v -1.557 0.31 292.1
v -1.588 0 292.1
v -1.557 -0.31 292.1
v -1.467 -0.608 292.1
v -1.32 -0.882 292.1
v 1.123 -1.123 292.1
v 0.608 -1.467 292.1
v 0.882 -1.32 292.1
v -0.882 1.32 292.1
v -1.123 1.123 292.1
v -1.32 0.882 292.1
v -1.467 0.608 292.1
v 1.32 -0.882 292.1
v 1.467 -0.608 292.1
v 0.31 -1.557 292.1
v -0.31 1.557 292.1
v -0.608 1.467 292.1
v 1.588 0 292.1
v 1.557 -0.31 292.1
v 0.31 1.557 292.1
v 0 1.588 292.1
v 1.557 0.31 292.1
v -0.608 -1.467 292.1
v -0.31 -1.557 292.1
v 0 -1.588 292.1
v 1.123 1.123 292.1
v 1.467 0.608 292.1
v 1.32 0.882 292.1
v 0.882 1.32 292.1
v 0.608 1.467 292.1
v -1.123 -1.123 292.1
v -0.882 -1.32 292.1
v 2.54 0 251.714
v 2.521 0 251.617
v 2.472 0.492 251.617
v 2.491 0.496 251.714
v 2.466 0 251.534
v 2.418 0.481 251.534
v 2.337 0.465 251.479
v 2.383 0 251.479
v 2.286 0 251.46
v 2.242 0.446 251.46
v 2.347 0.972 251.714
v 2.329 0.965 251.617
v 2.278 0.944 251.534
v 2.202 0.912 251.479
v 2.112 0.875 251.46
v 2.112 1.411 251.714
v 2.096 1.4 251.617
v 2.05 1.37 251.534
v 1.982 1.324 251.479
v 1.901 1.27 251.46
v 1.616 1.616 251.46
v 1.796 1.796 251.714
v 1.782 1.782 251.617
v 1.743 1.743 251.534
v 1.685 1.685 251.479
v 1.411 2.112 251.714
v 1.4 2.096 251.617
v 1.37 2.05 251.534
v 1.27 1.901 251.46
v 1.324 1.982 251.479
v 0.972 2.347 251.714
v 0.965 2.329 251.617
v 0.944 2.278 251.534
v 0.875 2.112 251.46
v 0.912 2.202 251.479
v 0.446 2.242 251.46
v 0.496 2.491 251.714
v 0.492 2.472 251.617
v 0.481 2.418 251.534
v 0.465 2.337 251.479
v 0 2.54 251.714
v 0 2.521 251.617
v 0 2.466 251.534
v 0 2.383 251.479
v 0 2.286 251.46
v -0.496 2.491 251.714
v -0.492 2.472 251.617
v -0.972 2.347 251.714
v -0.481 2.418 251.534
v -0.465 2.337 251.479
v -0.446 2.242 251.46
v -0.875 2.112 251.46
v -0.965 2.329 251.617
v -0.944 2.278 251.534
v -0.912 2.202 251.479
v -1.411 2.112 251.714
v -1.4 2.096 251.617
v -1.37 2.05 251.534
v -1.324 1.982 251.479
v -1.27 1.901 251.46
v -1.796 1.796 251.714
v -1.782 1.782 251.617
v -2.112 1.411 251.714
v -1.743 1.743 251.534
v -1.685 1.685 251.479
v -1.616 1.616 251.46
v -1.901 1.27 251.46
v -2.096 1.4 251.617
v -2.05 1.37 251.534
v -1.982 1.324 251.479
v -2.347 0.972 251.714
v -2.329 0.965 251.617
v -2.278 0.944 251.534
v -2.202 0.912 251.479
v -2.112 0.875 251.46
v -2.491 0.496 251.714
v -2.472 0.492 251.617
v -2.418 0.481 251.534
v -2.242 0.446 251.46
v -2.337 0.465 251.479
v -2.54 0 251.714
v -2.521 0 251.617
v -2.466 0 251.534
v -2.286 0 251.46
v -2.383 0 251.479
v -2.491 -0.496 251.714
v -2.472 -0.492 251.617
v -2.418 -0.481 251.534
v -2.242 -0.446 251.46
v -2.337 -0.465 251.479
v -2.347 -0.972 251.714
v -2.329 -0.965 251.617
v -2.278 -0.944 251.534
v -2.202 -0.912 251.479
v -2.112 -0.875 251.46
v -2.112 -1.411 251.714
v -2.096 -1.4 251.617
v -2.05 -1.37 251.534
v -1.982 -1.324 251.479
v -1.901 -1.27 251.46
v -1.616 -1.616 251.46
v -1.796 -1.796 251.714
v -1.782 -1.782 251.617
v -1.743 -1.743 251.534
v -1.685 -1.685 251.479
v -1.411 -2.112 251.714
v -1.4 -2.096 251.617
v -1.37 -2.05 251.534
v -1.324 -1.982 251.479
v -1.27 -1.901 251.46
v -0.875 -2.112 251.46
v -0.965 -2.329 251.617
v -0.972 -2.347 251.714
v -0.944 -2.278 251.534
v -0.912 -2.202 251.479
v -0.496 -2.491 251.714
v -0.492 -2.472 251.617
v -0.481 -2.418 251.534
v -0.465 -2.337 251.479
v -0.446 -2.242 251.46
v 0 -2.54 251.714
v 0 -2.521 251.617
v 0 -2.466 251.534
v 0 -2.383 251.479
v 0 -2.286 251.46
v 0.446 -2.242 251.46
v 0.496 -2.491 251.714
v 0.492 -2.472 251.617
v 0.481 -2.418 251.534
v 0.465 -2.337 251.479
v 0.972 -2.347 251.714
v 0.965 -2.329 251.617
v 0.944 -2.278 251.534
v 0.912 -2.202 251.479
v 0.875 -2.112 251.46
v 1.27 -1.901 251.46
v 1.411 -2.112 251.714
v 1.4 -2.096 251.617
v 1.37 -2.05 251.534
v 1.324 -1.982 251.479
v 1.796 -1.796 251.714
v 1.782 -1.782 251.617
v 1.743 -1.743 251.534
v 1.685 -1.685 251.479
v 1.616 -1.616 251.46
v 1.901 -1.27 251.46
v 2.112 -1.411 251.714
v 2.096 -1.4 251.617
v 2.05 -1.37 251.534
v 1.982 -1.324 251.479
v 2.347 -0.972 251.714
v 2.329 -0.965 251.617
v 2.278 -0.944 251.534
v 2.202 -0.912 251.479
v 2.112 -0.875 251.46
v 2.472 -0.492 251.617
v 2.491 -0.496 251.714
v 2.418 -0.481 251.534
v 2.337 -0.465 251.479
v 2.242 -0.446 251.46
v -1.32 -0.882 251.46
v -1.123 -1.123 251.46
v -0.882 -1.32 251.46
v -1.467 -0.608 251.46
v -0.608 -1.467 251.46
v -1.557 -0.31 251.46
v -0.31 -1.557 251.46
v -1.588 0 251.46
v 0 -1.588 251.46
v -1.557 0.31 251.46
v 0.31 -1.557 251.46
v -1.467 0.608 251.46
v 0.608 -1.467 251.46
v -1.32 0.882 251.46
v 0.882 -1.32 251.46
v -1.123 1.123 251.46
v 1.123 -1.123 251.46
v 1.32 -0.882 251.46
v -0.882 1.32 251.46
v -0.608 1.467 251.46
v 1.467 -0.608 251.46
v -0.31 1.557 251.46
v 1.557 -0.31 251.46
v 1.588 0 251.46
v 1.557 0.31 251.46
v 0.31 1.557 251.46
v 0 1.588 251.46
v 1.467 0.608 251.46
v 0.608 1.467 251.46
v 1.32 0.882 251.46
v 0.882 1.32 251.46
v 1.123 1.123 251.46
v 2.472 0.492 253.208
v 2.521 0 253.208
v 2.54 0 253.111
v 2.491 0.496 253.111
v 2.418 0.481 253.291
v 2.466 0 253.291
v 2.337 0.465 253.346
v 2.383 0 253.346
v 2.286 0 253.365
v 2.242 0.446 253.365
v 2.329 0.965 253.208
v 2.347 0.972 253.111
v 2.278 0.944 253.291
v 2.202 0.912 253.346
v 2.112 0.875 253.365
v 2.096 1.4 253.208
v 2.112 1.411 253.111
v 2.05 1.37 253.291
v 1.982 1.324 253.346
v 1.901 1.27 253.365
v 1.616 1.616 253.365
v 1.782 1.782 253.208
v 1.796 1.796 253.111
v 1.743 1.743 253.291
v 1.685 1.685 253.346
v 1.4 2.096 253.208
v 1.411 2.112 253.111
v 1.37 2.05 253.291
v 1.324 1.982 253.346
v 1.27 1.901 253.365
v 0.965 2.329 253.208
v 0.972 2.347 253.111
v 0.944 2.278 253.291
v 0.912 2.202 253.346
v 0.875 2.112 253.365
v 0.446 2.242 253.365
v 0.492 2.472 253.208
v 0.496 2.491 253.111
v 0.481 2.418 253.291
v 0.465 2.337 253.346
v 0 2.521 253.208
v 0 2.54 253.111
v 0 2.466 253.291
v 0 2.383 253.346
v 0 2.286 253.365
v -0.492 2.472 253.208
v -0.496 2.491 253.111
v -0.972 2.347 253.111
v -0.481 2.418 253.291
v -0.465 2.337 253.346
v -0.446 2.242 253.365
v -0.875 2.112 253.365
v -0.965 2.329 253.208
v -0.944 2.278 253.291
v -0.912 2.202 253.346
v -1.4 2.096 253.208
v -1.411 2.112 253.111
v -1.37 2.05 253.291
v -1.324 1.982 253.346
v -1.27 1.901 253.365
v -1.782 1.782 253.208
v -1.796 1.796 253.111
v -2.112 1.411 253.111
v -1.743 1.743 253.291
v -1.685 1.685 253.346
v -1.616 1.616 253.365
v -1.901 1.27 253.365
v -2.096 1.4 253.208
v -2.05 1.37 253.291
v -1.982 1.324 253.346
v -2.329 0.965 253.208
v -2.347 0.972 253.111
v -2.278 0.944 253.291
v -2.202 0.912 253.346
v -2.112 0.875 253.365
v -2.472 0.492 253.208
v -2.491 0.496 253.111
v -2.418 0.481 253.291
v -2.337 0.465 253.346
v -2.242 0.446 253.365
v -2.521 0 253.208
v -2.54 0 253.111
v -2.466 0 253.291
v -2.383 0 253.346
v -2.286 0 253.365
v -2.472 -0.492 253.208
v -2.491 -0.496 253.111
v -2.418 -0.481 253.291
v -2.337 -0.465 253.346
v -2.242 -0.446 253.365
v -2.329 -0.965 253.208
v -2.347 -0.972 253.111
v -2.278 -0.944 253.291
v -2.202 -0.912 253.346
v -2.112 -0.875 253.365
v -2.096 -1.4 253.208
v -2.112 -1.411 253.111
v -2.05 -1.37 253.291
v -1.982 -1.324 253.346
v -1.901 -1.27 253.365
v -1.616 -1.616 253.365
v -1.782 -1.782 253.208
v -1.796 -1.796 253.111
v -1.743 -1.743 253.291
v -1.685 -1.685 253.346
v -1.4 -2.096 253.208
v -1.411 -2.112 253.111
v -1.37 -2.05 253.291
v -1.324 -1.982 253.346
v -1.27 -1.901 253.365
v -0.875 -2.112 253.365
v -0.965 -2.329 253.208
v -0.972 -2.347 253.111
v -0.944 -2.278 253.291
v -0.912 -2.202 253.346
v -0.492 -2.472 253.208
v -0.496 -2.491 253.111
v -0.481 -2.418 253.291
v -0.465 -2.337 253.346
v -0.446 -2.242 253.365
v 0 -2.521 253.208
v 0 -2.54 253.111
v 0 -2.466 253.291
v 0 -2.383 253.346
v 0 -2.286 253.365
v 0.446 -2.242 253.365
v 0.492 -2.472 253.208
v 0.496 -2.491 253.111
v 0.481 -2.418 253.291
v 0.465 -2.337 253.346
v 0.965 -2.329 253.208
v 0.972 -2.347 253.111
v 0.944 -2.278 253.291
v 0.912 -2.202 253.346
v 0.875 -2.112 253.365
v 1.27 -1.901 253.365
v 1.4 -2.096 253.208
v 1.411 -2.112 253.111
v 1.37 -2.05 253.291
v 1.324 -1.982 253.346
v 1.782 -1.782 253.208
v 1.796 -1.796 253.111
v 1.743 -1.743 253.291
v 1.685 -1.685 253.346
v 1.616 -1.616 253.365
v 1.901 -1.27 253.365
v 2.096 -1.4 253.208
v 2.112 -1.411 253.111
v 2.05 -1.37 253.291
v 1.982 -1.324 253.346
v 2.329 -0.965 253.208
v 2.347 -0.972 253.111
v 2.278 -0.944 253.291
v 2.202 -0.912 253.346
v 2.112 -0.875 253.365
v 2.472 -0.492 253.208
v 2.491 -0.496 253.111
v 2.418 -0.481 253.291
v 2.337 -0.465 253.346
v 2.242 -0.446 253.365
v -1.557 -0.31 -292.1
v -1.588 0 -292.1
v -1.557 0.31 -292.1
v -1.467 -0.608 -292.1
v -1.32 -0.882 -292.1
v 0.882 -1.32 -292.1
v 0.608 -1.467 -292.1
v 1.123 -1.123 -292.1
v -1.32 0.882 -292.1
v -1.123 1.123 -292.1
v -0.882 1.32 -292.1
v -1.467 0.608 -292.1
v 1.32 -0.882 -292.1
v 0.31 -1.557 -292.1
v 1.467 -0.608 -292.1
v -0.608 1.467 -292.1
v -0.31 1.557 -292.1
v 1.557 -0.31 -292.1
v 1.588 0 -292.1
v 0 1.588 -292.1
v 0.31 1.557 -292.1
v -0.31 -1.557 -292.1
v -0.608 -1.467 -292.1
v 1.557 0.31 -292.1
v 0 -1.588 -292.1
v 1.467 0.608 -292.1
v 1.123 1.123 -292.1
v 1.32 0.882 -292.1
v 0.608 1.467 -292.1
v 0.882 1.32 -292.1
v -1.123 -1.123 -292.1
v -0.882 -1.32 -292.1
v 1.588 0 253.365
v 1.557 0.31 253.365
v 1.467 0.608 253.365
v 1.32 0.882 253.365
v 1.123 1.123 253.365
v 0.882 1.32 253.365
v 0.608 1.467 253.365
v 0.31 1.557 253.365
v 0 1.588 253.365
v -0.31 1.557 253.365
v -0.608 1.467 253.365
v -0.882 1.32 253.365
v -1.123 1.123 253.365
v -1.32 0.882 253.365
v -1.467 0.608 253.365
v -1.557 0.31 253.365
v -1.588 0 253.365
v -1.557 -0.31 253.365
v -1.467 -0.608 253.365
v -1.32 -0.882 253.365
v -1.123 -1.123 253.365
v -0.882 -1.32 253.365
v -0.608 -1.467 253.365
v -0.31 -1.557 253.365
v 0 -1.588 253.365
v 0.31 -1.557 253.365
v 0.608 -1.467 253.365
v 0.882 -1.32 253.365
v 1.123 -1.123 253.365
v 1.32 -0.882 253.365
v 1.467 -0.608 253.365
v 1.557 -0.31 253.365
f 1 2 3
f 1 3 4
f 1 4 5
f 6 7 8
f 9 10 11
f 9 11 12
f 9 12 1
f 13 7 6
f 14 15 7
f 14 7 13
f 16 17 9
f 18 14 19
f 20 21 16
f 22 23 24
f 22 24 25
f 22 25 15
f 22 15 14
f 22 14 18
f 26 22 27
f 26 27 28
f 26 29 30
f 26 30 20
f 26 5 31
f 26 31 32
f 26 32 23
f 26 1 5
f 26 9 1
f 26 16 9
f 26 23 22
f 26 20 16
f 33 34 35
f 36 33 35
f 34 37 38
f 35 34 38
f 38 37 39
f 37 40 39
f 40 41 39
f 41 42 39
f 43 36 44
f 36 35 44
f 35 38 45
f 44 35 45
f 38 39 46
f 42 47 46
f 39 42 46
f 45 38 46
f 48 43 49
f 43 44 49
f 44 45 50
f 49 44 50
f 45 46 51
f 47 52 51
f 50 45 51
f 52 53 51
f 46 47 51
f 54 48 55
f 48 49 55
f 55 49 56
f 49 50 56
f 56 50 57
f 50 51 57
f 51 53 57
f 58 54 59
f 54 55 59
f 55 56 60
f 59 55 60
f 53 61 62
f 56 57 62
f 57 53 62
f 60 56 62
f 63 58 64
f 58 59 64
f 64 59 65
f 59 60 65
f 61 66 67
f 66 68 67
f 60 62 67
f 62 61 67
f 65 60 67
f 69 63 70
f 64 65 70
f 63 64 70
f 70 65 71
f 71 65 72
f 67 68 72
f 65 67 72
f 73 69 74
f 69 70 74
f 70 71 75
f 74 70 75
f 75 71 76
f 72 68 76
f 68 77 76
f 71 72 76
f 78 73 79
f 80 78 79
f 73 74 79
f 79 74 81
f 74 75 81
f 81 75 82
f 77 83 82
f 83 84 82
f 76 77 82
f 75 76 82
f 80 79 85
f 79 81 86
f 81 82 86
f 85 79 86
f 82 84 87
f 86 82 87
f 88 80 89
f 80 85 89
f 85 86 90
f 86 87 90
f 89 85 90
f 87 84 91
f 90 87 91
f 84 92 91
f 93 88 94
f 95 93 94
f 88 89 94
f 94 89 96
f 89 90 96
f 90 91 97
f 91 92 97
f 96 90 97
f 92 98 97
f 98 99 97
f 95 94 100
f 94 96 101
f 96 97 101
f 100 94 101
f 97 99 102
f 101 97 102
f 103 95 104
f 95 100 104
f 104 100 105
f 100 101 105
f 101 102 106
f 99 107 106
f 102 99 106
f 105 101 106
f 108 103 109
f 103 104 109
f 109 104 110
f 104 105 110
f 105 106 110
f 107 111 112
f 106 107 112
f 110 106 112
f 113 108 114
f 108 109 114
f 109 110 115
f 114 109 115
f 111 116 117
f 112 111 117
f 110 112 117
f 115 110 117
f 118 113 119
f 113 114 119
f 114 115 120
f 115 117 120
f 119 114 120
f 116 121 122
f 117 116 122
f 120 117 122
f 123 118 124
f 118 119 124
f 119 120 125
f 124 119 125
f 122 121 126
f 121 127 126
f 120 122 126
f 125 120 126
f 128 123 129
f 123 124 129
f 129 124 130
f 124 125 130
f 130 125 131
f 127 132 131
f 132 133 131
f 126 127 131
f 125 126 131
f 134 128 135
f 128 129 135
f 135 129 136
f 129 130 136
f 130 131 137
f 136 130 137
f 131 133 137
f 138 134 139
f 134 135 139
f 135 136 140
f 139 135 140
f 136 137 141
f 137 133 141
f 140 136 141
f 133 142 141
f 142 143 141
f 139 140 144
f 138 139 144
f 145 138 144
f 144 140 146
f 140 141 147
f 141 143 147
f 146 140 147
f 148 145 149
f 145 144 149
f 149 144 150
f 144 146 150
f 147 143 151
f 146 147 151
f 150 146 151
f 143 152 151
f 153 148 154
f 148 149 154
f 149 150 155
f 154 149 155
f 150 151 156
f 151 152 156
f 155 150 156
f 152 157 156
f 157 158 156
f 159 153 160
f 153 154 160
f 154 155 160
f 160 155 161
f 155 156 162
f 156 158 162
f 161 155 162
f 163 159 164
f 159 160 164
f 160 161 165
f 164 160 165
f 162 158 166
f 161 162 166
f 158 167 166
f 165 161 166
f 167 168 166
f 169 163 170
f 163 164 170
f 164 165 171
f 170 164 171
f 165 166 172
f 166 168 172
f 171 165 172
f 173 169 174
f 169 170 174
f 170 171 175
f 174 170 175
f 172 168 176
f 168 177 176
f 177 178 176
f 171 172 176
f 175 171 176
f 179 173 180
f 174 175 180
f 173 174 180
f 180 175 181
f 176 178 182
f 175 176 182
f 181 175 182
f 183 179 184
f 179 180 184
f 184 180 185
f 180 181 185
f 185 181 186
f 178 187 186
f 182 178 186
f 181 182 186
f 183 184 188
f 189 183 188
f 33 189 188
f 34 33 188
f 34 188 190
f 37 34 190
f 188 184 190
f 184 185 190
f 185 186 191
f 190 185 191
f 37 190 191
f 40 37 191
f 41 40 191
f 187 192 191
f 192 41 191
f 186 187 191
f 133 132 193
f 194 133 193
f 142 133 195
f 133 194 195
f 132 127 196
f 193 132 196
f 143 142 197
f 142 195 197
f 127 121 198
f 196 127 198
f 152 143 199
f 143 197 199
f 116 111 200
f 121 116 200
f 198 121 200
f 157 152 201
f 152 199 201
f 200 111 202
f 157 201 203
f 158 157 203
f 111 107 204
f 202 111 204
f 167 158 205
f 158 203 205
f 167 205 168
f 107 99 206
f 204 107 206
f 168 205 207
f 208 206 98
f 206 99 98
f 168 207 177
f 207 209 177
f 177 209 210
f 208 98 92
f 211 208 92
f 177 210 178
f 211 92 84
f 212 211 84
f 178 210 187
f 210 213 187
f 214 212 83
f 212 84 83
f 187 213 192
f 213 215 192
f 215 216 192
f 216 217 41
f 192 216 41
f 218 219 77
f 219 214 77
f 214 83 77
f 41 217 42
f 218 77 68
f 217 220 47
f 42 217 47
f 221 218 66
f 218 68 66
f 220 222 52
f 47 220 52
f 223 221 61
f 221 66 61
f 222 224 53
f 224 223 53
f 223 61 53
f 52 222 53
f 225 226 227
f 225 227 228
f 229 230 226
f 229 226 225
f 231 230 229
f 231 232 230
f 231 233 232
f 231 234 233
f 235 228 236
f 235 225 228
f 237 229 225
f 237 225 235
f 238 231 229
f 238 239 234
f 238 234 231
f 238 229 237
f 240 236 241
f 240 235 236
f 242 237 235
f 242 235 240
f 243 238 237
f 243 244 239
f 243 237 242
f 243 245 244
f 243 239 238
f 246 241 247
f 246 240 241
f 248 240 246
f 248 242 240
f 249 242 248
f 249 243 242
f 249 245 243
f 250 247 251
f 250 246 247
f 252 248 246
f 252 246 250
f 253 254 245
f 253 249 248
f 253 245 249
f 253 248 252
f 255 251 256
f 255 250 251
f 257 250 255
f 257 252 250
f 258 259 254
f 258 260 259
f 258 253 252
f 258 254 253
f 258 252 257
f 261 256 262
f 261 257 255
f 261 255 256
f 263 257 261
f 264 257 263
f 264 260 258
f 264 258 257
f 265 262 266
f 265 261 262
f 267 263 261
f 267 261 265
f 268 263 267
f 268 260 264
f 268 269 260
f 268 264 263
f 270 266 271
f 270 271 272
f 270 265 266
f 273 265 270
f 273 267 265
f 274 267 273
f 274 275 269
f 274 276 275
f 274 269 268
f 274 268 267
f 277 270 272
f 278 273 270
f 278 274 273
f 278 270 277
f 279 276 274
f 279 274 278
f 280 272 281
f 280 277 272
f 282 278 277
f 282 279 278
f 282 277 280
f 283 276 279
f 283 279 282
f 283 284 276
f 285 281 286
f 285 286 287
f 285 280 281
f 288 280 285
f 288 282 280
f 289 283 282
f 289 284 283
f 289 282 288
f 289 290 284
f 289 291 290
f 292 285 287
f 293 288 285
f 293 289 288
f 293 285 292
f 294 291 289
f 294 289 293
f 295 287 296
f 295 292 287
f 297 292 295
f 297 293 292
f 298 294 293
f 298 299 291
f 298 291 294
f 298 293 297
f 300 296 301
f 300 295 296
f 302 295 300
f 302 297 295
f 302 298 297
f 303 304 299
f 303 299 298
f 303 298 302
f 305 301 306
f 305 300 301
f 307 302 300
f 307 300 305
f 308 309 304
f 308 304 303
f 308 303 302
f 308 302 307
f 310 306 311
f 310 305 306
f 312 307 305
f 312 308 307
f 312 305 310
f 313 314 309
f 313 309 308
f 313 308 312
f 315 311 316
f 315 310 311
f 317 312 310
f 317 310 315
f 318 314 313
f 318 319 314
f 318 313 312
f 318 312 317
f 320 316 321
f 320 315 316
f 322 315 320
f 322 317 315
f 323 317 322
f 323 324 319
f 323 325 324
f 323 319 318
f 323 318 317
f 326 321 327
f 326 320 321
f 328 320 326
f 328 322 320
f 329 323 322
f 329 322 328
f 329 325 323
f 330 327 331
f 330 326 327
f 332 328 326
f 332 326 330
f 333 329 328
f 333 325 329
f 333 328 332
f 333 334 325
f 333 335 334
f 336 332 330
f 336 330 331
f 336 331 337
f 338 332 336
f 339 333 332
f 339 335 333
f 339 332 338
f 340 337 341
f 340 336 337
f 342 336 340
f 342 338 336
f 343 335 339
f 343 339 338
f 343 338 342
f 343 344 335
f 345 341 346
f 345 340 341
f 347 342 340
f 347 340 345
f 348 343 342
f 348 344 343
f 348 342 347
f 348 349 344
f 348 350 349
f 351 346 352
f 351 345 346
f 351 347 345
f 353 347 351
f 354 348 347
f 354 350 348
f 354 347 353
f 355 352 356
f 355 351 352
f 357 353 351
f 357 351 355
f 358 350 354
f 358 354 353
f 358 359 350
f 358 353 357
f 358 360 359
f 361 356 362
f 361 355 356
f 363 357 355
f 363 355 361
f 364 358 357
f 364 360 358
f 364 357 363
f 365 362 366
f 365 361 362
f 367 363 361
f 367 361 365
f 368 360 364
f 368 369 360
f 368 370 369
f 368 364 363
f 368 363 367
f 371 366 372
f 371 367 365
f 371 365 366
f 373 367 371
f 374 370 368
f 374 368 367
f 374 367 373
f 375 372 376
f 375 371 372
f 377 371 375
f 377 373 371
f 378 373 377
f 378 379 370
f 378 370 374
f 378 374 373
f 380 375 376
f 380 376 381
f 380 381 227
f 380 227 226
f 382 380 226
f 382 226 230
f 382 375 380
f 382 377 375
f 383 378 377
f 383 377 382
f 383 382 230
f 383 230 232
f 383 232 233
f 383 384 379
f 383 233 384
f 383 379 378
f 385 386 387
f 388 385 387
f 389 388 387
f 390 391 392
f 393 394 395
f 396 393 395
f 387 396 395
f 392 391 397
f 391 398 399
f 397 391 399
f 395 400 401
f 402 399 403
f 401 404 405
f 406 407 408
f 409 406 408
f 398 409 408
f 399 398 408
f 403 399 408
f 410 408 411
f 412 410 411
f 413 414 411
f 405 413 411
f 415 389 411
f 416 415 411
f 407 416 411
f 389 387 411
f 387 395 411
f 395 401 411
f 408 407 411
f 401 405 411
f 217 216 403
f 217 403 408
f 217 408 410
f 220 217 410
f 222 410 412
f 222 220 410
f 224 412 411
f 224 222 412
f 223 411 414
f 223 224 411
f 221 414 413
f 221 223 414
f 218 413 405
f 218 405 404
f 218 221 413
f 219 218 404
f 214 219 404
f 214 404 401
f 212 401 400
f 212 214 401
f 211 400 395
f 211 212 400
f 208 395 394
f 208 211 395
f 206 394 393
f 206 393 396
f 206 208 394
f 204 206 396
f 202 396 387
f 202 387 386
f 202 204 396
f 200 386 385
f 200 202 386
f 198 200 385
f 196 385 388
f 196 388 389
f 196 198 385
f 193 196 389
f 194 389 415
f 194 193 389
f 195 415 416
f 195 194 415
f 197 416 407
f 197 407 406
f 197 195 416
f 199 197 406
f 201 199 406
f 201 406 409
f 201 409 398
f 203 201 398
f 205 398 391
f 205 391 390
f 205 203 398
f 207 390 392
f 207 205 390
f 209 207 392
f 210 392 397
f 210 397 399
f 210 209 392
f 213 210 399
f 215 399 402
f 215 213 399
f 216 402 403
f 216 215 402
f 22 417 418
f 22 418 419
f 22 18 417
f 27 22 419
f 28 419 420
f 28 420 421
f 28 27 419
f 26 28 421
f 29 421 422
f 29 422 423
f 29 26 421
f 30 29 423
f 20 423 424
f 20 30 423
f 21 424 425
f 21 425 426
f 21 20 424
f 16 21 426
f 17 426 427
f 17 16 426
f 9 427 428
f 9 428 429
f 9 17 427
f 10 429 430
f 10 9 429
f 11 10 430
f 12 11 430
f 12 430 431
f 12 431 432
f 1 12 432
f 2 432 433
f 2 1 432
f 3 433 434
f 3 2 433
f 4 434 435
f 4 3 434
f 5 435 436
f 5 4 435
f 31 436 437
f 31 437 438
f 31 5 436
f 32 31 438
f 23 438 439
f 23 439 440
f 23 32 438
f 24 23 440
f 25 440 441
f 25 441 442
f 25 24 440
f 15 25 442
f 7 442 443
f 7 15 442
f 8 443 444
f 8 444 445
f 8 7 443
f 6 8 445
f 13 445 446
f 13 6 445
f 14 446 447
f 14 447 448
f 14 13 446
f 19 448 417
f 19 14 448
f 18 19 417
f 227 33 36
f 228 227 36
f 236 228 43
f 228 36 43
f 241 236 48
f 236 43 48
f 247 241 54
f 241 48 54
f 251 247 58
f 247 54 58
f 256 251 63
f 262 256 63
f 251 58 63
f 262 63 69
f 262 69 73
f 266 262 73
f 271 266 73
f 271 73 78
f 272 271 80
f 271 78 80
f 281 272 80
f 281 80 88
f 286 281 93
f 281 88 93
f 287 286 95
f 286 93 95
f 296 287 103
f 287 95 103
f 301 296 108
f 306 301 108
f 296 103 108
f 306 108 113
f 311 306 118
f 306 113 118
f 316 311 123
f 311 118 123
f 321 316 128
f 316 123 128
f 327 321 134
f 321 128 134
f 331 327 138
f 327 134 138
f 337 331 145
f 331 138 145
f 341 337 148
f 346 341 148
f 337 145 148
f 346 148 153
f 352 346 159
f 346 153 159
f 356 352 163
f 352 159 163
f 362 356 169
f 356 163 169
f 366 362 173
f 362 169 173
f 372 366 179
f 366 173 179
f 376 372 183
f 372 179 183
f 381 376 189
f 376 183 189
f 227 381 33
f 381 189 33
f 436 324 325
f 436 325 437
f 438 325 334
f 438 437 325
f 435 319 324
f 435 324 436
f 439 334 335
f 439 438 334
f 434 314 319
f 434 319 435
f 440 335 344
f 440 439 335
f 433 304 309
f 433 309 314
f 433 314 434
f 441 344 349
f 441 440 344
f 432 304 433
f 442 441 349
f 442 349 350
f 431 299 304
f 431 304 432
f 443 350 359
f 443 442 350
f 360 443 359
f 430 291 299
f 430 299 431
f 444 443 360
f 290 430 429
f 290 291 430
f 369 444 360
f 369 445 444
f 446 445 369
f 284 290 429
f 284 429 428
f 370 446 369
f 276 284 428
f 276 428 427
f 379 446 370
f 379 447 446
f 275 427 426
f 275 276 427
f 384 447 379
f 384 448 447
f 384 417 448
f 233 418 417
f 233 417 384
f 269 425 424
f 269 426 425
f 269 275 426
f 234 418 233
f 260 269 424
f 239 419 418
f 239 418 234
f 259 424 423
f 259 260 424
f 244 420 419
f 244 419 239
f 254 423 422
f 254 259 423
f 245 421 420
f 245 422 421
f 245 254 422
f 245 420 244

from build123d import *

# Parameters (mm, degrees)
F0_R     = 1.5875
F1_DEPTH = 292.1
F3_R     = 2.54
F4_DEPTH = 1.905
F5_R     = 0.254


with BuildPart() as f1:
    # F0 (on Top) → F1 (new body, symmetric)
    with BuildSketch(Plane.XY):
        Circle(F0_R)
    extrude(amount=F1_DEPTH, both=True)

    # F3 (on offset) → F4 (join)
    with BuildSketch(Plane.XY.offset(251.46)):
        Circle(F3_R)
    extrude(amount=F4_DEPTH)

    # F5
    f5_edges = [f1.edges().sort_by_distance(p)[0] for p in [
        (-2.54, 0, 253.365),
        (-2.54, 0, 251.46),
    ]]
    fillet(f5_edges, radius=F5_R)


solid = f1.part
